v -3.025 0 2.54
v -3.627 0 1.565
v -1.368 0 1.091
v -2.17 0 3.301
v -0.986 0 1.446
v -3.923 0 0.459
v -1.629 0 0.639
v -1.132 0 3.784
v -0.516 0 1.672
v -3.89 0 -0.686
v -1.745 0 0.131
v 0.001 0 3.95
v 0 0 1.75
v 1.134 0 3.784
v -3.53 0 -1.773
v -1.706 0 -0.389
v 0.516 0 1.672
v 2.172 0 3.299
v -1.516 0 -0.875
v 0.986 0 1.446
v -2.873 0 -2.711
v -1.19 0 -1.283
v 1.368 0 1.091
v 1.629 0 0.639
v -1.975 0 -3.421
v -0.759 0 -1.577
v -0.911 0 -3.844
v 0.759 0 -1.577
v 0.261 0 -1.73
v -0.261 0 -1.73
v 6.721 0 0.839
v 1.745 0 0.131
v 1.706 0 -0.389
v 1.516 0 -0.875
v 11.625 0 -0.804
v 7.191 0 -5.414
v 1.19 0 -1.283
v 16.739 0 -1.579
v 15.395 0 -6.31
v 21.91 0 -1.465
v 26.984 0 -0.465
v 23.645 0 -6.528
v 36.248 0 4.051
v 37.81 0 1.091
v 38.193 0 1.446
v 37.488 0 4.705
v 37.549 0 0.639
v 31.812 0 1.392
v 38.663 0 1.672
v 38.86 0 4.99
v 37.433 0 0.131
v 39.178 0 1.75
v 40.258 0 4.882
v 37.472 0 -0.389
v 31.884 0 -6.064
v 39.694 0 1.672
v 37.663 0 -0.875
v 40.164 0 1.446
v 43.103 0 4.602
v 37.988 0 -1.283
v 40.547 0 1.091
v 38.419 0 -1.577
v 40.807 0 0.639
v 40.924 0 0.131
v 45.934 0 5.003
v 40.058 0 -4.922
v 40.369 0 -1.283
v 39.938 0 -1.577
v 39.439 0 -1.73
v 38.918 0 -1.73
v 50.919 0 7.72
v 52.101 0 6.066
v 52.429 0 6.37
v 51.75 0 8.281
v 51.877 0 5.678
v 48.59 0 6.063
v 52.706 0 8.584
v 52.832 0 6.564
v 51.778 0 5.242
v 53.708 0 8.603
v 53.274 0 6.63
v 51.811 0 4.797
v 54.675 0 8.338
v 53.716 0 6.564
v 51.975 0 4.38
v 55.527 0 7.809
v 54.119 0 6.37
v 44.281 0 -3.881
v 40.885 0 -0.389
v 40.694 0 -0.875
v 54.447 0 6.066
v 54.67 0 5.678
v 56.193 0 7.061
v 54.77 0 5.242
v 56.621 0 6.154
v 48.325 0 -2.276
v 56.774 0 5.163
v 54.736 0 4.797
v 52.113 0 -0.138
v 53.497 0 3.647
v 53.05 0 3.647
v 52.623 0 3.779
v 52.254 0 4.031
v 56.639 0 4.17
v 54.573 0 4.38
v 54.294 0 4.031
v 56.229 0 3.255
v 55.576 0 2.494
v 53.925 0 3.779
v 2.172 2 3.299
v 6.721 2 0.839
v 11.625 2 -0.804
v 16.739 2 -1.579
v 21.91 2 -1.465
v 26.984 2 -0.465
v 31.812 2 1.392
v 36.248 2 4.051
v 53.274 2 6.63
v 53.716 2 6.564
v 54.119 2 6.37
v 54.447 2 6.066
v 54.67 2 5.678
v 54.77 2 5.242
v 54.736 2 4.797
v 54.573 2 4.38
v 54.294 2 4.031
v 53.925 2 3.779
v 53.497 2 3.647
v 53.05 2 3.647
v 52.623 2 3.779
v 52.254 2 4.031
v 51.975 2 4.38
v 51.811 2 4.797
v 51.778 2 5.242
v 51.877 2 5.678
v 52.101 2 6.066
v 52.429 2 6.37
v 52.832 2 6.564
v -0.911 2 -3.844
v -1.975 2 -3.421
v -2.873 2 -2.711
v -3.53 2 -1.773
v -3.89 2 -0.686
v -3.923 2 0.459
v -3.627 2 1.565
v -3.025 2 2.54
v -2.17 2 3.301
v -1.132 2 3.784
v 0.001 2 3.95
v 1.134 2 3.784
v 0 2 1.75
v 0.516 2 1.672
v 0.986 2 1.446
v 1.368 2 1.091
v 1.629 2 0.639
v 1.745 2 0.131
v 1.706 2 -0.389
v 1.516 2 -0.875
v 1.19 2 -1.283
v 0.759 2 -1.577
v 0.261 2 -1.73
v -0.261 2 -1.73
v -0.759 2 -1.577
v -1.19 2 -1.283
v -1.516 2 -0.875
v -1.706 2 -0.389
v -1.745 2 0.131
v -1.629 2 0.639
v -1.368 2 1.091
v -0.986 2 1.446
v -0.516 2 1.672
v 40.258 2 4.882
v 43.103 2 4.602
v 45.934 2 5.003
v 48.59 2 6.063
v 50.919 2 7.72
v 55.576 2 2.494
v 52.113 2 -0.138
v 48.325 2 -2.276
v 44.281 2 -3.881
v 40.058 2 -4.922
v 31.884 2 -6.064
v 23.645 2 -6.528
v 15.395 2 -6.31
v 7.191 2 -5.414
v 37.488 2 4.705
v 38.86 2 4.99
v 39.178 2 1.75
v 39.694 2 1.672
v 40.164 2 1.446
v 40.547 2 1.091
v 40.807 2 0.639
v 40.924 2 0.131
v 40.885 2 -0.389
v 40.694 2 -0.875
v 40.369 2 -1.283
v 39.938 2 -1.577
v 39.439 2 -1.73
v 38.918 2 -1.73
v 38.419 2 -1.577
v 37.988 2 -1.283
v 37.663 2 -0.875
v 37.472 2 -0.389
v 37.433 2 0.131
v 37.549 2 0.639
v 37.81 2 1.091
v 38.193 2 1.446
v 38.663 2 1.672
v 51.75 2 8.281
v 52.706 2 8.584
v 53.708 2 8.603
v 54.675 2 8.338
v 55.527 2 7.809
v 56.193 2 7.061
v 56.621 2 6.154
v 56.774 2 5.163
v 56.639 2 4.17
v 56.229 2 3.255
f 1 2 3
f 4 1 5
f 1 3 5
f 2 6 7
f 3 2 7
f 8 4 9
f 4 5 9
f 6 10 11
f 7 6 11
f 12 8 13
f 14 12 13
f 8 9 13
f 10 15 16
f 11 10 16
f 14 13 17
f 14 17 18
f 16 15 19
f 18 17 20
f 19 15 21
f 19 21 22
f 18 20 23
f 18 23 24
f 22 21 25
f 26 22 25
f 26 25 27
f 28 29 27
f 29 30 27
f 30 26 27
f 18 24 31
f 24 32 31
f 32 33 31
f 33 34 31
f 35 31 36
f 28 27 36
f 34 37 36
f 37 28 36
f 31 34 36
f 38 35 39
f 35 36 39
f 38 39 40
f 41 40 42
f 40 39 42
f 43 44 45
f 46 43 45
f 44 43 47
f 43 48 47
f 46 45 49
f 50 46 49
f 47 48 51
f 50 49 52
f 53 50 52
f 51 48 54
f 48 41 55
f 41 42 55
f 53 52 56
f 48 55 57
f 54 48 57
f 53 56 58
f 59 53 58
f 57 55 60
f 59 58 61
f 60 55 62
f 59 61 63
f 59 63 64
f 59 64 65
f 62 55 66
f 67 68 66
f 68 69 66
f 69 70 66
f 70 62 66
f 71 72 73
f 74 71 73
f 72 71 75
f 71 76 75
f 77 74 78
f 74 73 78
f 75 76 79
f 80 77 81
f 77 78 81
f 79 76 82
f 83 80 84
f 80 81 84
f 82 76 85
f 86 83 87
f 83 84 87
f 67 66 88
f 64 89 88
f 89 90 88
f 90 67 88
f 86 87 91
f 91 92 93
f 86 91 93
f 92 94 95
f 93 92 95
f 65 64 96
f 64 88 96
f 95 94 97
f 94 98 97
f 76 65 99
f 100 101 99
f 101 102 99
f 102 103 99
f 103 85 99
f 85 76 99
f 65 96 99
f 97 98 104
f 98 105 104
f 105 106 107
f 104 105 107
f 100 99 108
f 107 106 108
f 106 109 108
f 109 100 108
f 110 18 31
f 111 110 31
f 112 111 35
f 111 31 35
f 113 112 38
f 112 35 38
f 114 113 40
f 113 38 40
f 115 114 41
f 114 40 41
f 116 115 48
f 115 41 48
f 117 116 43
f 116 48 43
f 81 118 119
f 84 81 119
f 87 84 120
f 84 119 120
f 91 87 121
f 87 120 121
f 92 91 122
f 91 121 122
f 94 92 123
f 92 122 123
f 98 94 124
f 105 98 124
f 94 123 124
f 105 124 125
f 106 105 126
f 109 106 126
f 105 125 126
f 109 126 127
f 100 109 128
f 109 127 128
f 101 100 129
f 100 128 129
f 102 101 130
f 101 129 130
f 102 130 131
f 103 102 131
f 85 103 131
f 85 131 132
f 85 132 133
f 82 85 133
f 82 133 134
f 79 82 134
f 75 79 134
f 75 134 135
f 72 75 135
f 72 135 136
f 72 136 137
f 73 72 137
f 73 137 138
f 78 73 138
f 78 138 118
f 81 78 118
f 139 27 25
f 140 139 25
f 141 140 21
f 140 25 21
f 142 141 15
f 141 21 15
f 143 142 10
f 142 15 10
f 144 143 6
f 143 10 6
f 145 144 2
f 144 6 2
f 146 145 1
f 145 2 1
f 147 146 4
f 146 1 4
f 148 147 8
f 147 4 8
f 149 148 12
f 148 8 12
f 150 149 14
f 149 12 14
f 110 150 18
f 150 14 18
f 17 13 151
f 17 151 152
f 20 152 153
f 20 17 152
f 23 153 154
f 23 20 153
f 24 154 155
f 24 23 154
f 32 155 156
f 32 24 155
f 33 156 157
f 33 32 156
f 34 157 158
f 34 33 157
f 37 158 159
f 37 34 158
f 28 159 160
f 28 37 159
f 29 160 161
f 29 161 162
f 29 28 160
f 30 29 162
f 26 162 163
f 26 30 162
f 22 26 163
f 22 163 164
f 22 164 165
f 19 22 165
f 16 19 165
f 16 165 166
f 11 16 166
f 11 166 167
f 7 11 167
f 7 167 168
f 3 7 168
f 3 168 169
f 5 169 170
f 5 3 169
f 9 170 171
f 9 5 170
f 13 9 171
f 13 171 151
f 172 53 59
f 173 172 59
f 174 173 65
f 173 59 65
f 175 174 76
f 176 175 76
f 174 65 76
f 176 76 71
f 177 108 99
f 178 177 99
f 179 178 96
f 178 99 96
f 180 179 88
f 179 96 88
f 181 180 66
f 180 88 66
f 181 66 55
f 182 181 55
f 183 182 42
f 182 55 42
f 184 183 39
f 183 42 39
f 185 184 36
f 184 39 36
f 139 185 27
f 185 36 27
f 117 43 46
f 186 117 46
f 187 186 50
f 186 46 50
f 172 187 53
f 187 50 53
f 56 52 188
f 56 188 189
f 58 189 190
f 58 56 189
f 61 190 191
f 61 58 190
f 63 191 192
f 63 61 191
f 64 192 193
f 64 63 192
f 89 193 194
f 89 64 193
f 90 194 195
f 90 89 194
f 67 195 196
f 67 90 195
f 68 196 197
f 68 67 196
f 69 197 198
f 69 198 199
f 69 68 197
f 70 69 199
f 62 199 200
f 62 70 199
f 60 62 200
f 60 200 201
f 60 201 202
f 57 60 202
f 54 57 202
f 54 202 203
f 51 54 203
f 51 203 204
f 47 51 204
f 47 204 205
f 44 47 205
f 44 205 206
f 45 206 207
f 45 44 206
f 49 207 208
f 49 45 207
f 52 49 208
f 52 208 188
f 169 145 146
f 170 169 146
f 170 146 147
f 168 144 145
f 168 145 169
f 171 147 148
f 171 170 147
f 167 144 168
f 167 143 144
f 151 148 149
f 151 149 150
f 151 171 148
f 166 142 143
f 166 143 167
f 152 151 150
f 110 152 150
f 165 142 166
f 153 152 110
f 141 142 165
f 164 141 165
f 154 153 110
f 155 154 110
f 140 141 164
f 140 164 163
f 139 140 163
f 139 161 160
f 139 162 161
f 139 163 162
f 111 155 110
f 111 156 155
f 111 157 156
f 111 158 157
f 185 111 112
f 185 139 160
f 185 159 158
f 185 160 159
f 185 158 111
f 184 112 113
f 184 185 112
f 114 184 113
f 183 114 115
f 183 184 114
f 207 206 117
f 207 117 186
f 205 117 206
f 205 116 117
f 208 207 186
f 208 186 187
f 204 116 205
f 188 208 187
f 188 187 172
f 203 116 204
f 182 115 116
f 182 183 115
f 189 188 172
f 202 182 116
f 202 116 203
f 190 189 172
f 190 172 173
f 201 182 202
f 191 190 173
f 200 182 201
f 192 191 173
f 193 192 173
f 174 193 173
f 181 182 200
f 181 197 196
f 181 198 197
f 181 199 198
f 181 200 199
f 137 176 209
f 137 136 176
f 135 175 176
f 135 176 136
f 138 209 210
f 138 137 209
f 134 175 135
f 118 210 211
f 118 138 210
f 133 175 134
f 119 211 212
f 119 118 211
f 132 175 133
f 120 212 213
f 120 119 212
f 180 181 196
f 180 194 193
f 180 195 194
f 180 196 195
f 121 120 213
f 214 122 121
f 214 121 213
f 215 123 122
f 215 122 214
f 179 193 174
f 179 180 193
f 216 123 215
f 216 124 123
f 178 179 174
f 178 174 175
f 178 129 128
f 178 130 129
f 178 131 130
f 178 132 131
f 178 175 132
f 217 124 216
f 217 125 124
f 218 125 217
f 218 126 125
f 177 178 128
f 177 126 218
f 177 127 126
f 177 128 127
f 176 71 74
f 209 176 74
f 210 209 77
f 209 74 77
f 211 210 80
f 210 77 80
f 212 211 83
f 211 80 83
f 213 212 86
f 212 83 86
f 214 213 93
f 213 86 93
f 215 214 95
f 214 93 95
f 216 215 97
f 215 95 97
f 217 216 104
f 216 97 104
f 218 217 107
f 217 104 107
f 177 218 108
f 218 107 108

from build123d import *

# Parameters (mm, degrees)
SKETCH1_R           = 1.75
SKETCH1_R_2         = 3.5
BOSS_EXTRUDE3_DEPTH = 2
SKETCH3_R           = 1.5
CUT_EXTRUDE1_DEPTH  = 58.460820006


with BuildPart() as part:
    # Sketch1 → Boss-Extrude3 (new body)
    # profile 1 of 2: a face of its own
    with BuildSketch(Plane(origin=(0, 0, 0), x_dir=(1, 0, 0), z_dir=(0, 1, 0))):
        with BuildLine():
            ThreePointArc((40.05780493, 4.92208645), (19.51761867, 6.504088301), (-0.91087774, 3.843540262))
            ThreePointArc((-0.91087774, 3.843540262), (-3.626704772, -1.56509185), (2.171657179, -3.299455273))
            ThreePointArc((2.171657179, -3.299455273), (19.326940327, 1.634092765), (36.247955143, -4.051229892))
            ThreePointArc((36.247955143, -4.051229892), (38.163769521, -4.895969245), (40.257507506, -4.882165276))
            ThreePointArc((40.257507506, -4.882165276), (45.933967375, -5.003120525), (50.919436714, -7.720089844))
            ThreePointArc((50.919436714, -7.720089844), (50.66068815, -2.80185284), (55.57610439, -2.494136696))
            ThreePointArc((55.57610439, -2.494136696), (48.324550131, 2.276108307), (40.05780493, 4.92208645))
        make_face()
        with Locations(Location((0, 0, 0), (0, 0, 270))):
            Circle(SKETCH1_R, mode=Mode.SUBTRACT)
        with Locations(Location((39.178405, 0, 0), (0, 0, 270))):
            Circle(SKETCH1_R, mode=Mode.SUBTRACT)
    # profile 2 of 2: a face of its own
    with BuildSketch(Plane(origin=(0, 0, 0), x_dir=(1, 0, 0), z_dir=(0, 1, 0))):
        with Locations((53.273794312, -5.13030215)):
            Circle(SKETCH1_R_2)
    extrude(amount=BOSS_EXTRUDE3_DEPTH)

    # Sketch3 → Cut-Extrude1 (cut, through all)
    with BuildSketch(Plane(origin=(0, 2, 0), x_dir=(1, 0, 0), z_dir=(0, 1, 0))):
        with Locations(Location((53.273794312, -5.13030215, 0), (0, 0, 270))):
            Circle(SKETCH3_R)
    extrude(amount=-CUT_EXTRUDE1_DEPTH, mode=Mode.SUBTRACT)


solid = part.part
